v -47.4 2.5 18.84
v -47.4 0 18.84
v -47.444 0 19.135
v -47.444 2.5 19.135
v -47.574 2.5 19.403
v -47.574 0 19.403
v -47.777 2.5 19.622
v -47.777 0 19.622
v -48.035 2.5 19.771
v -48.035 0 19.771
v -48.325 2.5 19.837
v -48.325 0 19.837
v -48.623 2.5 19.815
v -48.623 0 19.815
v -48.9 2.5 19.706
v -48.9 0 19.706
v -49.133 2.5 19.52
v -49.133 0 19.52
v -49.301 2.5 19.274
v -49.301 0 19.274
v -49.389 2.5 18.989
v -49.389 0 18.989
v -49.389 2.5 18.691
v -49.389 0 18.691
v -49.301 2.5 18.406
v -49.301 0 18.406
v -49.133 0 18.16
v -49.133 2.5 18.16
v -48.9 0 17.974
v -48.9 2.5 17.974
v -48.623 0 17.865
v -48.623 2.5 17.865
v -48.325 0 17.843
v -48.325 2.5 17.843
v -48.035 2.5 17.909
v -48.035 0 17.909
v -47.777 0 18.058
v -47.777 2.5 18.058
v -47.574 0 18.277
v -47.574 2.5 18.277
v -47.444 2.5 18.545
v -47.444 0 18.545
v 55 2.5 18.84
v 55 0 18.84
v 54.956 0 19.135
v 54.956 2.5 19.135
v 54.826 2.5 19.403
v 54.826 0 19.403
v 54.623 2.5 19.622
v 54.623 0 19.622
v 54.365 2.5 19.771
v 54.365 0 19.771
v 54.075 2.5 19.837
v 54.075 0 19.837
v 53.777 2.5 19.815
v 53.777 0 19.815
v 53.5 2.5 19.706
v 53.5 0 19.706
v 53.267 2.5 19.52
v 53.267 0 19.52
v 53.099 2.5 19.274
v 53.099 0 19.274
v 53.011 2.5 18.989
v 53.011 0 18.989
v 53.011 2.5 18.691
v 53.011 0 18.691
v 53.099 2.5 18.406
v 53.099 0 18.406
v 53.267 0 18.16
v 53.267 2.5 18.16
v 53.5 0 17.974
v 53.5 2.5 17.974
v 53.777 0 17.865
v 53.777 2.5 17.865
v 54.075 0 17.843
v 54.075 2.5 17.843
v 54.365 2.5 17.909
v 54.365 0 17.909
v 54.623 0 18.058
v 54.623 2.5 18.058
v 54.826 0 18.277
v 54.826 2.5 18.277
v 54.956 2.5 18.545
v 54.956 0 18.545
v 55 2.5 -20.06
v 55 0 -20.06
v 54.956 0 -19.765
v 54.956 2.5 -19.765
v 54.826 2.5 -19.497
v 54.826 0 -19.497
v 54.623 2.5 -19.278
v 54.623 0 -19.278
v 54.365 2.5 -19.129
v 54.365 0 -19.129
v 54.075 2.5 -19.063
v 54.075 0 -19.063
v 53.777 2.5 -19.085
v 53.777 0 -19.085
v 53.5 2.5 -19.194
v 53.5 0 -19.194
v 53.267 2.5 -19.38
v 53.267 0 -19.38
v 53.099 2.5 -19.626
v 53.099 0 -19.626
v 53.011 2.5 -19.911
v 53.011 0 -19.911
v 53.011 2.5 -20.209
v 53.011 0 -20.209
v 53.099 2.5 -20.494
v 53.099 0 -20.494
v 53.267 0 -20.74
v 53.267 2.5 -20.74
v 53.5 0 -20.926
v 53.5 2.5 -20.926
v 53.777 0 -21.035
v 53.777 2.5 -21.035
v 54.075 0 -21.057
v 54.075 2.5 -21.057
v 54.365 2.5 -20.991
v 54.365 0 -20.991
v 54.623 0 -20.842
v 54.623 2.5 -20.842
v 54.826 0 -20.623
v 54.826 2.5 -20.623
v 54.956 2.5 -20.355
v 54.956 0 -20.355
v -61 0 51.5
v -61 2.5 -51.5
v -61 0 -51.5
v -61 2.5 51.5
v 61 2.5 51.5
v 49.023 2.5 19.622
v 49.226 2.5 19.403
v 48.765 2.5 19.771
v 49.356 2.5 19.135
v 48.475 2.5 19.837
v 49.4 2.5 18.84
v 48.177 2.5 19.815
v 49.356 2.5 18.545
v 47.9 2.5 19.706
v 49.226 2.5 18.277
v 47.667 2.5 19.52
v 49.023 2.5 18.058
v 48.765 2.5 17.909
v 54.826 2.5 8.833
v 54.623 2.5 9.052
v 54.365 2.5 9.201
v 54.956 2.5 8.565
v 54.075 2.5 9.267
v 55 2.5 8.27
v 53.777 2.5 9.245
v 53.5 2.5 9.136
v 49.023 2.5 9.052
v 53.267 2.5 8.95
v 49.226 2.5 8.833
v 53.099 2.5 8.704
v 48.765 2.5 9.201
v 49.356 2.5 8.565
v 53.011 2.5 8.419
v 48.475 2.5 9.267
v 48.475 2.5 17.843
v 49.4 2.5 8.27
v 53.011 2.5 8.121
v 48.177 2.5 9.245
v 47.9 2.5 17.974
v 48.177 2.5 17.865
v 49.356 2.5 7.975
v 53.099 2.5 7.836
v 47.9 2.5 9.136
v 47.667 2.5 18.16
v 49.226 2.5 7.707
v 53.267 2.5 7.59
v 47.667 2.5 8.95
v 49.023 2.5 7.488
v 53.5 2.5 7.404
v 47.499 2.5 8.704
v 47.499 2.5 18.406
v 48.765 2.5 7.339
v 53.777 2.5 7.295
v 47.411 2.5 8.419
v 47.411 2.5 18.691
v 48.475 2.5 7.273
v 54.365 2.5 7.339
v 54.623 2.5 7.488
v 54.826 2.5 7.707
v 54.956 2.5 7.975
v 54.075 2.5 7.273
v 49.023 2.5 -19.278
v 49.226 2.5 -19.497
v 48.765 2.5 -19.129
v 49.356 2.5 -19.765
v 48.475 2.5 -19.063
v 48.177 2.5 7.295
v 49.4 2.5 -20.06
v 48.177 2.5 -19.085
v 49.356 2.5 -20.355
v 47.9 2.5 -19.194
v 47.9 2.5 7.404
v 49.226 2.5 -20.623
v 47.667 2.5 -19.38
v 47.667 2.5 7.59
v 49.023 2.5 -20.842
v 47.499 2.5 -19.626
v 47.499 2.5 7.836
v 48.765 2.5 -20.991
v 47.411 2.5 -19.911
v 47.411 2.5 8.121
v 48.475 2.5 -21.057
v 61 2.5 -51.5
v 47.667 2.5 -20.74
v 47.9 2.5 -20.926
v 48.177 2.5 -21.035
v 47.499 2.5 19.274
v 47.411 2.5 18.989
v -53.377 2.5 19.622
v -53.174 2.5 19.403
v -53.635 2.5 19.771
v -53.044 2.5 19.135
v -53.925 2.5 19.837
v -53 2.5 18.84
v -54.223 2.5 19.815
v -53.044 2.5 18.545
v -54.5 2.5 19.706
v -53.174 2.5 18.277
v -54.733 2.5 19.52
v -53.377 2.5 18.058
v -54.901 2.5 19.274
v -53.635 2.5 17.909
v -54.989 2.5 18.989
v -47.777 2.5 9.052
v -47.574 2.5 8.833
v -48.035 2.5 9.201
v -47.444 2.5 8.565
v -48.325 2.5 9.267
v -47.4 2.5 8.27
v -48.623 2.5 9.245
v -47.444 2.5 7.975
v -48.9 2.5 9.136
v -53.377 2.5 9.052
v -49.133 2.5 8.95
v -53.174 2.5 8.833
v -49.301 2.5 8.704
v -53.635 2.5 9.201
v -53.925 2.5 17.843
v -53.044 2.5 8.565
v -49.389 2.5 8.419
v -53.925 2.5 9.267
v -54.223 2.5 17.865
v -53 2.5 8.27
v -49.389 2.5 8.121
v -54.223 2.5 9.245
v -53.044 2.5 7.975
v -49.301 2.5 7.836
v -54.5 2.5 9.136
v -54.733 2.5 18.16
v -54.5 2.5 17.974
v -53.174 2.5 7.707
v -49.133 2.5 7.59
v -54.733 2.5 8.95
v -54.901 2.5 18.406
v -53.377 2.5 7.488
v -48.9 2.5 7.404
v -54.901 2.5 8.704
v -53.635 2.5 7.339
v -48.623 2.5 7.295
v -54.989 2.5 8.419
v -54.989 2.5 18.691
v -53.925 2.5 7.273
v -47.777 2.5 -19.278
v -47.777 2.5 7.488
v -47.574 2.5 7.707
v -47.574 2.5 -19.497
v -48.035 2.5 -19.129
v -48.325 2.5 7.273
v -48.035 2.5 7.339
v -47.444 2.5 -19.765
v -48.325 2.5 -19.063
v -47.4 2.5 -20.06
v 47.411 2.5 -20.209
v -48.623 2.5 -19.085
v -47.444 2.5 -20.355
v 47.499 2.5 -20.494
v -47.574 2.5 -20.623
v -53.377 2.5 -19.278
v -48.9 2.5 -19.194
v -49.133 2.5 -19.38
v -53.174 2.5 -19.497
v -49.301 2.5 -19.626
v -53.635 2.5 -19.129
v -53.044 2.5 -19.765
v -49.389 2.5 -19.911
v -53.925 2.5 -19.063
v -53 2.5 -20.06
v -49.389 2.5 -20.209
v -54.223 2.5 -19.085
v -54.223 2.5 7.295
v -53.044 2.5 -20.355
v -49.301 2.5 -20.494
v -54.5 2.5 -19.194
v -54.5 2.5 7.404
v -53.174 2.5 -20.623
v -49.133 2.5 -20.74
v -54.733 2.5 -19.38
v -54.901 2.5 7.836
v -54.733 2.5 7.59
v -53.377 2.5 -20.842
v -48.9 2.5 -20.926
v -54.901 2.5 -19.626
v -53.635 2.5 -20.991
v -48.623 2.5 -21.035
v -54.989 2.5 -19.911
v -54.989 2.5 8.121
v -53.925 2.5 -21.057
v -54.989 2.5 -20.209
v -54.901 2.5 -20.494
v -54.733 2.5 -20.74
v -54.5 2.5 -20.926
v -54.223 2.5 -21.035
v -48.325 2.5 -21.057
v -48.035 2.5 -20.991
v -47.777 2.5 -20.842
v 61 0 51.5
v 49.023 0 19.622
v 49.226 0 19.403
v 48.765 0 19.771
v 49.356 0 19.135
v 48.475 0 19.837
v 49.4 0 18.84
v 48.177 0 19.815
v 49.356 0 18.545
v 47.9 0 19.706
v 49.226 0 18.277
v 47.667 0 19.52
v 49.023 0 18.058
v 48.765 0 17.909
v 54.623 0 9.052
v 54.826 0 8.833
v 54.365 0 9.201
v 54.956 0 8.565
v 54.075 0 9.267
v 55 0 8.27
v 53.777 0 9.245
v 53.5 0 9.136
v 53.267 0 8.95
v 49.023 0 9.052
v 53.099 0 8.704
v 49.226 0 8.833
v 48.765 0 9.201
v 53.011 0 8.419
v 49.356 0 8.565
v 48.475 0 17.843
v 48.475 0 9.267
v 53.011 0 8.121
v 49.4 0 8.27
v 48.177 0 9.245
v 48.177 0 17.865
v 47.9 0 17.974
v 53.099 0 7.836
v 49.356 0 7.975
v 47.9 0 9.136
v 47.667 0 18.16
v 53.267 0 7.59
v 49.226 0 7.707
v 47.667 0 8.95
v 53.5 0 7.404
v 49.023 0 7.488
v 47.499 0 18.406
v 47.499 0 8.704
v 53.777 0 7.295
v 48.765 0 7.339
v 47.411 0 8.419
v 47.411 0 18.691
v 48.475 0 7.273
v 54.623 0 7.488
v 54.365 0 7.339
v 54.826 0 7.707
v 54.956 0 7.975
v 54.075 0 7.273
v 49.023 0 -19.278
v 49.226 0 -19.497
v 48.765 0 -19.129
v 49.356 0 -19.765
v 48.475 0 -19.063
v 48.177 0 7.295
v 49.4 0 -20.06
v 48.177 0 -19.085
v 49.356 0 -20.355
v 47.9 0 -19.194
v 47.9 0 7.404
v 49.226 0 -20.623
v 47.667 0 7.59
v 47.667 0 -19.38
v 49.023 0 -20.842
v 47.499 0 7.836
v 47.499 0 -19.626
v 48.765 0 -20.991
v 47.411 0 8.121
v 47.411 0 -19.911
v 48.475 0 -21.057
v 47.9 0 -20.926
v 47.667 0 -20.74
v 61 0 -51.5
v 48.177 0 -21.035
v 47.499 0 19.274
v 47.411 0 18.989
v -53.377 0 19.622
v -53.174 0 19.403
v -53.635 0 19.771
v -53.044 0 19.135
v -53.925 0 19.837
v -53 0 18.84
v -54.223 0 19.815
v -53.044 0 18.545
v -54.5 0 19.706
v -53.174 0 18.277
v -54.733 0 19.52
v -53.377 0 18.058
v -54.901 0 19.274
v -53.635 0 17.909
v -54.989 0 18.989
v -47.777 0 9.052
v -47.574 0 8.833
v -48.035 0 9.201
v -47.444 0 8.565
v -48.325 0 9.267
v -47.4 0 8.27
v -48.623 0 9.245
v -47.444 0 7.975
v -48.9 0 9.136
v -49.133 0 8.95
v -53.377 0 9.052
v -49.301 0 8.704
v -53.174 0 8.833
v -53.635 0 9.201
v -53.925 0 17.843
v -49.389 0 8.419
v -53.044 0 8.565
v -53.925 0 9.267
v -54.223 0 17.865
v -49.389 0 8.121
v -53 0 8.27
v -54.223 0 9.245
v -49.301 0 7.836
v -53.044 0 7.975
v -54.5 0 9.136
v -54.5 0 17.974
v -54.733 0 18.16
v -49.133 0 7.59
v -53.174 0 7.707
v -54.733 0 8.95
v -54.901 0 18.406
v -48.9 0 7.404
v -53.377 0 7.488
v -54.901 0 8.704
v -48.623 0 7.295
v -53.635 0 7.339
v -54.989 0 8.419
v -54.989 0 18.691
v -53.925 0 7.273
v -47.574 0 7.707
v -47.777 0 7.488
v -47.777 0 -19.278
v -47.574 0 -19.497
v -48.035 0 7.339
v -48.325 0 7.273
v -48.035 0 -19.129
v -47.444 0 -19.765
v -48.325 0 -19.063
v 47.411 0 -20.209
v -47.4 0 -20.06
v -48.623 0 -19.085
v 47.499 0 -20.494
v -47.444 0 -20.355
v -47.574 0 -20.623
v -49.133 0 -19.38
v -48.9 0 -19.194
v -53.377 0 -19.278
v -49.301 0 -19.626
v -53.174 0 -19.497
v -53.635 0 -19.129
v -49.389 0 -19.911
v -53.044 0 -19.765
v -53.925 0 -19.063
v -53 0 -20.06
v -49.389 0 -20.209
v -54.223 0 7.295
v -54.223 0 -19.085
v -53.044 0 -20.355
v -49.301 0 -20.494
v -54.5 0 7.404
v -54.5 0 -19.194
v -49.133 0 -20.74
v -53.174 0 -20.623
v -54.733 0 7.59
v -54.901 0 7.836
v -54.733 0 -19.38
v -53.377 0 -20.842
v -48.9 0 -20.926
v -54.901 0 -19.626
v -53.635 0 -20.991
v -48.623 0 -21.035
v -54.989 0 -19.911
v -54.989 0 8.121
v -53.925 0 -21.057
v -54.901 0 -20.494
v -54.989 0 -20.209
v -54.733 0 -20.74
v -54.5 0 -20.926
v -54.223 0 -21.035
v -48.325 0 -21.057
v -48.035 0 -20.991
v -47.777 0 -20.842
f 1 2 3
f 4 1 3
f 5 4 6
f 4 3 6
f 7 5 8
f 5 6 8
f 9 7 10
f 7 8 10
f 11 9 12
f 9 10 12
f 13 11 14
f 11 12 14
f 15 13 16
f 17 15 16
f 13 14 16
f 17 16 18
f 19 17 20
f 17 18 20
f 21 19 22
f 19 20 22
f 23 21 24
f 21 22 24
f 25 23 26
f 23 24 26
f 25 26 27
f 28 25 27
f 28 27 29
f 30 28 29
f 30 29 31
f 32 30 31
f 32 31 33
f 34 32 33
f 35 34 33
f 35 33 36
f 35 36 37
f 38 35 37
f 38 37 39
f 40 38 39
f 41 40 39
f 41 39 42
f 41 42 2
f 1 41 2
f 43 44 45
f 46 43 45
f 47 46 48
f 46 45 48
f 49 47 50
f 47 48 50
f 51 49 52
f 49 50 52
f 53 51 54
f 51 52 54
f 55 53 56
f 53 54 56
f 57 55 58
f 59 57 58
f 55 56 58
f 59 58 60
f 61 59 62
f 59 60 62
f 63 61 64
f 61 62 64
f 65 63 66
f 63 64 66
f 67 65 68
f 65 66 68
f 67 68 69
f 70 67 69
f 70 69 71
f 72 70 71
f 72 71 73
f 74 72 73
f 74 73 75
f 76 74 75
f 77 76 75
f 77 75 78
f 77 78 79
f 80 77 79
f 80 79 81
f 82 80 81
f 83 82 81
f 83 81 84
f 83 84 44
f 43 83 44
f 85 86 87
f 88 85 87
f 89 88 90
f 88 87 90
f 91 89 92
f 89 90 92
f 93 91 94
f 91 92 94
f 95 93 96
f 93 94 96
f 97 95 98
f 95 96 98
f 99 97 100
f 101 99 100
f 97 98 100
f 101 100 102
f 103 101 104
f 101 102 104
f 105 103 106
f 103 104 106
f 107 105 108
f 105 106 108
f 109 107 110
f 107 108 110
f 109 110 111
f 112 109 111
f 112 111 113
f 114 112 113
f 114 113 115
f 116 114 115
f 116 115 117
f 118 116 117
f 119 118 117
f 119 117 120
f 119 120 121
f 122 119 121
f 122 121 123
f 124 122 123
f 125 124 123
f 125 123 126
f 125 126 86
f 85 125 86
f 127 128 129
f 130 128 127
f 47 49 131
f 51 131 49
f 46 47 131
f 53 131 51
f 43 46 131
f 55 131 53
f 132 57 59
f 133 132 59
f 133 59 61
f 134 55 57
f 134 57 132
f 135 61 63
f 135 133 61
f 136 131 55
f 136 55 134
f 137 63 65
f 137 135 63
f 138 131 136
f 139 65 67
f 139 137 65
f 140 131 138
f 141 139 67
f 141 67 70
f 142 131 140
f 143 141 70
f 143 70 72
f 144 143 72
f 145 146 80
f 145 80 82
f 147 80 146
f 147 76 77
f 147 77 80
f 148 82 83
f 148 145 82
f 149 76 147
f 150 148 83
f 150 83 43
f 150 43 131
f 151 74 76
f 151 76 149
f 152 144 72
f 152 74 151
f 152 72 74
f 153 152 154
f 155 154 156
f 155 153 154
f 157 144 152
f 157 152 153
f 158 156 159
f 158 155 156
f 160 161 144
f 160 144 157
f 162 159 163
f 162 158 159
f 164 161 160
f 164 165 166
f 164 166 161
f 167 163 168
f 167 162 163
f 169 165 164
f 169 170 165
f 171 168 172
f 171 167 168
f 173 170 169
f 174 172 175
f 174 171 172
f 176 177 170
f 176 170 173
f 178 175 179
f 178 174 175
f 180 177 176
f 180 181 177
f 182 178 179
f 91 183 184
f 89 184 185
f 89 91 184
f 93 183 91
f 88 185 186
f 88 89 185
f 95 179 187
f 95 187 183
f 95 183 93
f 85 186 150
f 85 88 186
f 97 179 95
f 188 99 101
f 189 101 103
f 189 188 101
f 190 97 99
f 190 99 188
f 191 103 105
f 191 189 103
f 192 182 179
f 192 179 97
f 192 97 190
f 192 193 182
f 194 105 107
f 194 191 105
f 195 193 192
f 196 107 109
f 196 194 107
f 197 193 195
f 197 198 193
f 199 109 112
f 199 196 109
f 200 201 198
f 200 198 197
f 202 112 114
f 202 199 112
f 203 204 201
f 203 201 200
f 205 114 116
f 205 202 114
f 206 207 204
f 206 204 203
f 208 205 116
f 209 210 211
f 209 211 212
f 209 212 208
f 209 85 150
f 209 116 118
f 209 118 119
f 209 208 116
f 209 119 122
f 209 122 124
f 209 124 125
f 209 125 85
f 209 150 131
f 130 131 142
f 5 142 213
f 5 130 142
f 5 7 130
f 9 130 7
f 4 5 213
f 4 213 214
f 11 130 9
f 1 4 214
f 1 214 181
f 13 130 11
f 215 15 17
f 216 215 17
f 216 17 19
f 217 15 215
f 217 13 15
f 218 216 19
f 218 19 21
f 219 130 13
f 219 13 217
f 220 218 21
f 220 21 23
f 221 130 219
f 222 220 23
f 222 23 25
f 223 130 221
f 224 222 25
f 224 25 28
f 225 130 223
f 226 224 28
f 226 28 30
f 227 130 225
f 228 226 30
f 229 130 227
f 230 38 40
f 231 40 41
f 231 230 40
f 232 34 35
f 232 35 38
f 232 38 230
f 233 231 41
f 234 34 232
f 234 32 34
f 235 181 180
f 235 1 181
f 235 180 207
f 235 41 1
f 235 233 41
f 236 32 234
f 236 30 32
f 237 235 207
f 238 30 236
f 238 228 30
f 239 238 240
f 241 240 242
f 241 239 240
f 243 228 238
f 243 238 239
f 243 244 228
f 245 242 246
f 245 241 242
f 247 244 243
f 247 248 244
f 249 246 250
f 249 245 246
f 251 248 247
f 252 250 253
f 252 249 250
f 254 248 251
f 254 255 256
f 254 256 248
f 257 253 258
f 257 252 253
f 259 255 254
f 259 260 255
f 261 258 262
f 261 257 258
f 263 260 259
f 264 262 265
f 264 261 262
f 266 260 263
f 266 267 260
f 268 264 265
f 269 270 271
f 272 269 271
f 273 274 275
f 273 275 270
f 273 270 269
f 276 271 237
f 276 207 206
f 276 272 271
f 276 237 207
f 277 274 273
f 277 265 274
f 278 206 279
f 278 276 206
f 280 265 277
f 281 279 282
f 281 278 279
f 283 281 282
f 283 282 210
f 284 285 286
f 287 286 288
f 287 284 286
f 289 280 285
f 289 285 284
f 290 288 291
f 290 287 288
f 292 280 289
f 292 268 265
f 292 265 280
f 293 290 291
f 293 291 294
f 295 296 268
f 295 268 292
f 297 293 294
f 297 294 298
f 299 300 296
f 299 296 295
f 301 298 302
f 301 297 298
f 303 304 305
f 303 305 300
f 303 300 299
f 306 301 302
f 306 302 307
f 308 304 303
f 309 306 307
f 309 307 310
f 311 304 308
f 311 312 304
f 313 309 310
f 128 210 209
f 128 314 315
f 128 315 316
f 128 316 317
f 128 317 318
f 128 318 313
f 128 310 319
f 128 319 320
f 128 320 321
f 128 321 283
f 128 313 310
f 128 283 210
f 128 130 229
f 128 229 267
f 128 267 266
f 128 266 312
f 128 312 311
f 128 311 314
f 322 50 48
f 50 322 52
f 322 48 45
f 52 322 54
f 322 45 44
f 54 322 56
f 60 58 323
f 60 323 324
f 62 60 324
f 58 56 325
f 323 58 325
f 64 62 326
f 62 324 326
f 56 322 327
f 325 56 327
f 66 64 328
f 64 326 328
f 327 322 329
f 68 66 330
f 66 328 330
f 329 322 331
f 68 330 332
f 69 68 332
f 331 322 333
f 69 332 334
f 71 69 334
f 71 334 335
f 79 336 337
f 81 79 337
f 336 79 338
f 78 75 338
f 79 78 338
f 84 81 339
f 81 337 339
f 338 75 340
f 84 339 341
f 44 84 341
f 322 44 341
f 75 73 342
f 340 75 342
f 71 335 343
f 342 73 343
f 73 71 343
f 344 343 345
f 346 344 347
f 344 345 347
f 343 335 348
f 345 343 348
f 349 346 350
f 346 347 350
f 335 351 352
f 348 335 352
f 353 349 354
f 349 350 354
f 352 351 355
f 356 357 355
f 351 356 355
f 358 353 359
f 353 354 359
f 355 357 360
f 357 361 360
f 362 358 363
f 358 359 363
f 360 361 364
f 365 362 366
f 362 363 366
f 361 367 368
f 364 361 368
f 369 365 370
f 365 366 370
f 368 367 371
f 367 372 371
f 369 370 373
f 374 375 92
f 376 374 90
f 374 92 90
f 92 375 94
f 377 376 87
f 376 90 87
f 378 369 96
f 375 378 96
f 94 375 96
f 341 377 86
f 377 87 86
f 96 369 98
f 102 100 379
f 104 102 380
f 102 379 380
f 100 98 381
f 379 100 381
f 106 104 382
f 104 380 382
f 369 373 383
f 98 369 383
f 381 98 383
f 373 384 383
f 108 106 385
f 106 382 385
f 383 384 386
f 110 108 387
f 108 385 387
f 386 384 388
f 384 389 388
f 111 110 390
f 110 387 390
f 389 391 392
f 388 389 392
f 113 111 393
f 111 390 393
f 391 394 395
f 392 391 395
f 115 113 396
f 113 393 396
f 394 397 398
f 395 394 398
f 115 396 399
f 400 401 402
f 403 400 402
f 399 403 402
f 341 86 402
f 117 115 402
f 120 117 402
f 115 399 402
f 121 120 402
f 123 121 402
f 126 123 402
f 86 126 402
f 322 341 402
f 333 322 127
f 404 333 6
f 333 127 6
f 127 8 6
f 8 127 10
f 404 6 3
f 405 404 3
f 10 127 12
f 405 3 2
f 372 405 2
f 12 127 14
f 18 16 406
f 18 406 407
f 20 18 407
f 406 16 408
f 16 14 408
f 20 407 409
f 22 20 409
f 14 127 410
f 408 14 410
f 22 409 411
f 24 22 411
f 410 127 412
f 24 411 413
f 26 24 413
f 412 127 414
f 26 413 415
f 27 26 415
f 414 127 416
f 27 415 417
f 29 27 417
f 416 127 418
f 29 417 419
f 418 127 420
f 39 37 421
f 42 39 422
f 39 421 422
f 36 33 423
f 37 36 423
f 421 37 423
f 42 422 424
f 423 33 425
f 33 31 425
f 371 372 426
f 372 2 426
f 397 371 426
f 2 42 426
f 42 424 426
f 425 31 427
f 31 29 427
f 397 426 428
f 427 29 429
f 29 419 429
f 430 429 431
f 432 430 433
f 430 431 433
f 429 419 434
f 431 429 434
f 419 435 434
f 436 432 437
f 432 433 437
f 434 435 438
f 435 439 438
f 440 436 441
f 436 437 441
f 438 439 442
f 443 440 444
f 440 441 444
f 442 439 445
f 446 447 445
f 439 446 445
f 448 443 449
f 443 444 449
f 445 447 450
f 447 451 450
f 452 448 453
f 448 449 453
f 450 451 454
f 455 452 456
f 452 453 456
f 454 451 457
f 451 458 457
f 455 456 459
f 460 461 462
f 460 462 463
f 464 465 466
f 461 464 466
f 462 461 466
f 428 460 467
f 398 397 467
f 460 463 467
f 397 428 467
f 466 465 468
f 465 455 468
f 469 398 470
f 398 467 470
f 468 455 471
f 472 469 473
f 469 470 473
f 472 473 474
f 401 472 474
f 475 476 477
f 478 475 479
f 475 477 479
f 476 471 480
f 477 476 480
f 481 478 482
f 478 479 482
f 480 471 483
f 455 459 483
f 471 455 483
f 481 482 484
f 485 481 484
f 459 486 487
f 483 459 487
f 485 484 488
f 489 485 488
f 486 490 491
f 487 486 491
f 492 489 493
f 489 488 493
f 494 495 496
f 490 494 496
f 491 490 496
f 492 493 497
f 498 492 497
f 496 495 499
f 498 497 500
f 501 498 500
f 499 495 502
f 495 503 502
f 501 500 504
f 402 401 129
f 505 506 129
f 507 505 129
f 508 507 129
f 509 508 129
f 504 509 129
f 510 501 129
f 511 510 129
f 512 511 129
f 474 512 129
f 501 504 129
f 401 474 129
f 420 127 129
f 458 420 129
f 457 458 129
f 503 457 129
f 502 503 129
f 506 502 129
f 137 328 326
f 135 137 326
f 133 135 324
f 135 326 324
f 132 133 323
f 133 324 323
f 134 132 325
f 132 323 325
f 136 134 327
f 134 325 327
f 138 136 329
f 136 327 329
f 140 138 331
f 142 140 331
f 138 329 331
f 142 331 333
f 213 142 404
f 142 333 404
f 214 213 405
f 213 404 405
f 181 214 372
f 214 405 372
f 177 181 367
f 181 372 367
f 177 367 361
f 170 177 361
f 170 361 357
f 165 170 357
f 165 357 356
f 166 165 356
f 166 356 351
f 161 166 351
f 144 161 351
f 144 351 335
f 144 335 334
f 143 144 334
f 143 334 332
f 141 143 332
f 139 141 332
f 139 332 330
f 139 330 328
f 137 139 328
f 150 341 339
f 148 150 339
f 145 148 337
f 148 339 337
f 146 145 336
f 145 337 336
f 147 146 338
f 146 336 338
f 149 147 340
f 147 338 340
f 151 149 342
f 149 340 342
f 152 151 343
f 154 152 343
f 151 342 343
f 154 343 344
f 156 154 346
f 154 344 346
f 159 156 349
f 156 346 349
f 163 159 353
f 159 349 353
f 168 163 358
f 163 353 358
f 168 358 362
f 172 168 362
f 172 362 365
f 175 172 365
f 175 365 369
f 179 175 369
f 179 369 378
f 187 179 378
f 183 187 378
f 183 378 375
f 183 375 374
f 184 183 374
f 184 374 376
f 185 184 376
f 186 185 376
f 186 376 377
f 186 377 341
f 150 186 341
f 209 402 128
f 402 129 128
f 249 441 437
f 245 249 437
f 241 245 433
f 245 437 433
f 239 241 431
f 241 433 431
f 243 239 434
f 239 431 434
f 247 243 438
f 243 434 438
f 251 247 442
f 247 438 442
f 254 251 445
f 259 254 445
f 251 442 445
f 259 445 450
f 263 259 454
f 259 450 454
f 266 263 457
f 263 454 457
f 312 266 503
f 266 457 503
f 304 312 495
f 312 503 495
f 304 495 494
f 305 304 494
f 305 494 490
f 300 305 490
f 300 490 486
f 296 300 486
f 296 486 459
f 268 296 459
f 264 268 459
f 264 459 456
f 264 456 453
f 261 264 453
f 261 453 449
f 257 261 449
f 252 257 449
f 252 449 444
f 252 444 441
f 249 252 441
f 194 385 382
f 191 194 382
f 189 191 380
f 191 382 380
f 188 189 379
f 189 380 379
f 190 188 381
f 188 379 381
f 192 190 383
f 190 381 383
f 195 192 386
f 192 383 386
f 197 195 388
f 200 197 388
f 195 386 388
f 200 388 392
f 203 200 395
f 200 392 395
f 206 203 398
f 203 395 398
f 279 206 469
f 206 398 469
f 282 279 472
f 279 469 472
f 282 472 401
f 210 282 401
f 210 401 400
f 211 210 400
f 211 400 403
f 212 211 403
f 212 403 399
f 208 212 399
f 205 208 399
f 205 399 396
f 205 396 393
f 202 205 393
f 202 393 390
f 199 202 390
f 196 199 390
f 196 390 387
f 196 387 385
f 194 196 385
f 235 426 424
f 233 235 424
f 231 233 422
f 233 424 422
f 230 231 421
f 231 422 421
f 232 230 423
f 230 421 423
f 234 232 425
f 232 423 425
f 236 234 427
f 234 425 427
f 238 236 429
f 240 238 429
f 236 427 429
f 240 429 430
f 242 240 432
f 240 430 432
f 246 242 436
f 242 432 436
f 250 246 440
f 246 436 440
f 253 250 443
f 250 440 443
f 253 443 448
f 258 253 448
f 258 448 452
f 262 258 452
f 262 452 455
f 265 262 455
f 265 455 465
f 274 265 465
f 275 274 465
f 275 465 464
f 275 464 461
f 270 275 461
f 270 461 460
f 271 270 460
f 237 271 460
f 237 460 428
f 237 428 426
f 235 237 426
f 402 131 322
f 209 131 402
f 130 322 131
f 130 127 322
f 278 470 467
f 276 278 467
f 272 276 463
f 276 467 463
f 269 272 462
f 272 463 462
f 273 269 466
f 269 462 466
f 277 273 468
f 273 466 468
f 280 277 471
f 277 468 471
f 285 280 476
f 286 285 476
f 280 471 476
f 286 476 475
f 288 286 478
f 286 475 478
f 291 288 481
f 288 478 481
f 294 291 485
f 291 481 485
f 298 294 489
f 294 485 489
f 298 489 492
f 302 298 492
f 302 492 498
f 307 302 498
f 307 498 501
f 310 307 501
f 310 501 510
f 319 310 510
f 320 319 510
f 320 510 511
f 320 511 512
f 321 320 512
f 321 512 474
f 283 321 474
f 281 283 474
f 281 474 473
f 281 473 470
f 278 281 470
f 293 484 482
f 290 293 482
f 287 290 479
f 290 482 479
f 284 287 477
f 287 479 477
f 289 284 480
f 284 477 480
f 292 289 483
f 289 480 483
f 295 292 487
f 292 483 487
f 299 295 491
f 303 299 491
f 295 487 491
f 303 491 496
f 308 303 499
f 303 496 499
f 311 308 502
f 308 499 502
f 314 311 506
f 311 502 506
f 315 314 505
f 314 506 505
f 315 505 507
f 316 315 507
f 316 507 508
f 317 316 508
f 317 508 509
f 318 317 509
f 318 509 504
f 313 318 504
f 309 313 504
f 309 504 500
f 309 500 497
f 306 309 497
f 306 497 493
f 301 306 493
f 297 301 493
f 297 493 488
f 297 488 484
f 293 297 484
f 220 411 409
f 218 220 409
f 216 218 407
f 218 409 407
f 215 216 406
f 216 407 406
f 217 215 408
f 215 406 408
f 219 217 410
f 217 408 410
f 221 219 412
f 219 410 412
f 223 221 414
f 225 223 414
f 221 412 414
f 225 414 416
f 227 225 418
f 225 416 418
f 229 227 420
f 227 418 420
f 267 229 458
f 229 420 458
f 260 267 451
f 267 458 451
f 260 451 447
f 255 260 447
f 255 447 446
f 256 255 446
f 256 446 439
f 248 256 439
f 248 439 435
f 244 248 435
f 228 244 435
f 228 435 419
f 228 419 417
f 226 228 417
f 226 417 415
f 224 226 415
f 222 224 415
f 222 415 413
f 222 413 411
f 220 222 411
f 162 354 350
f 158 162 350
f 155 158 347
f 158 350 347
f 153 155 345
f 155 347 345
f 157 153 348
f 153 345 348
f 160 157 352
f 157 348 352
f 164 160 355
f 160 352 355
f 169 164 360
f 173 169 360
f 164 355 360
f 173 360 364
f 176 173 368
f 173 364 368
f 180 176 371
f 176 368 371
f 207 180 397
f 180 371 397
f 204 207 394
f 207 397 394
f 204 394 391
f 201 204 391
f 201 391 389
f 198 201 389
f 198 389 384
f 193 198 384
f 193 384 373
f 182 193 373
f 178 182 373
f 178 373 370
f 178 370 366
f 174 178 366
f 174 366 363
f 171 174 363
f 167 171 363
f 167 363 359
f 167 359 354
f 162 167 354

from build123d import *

# Parameters (mm, degrees)
SKETCH1_W           = 119
SKETCH1_H           = 103
BOSS_EXTRUDE1_DEPTH = 2.5
SKETCH2_R           = 1
CUT_EXTRUDE1_DEPTH  = 10
SKETCH3_W           = 103
SKETCH3_H           = 2.5
BOSS_EXTRUDE2_DEPTH = 1.5
SKETCH4_W           = 103
SKETCH4_H           = 2.5
BOSS_EXTRUDE3_DEPTH = 1.5


with BuildPart() as part:
    # Sketch1 → Boss-Extrude1 (new body)
    with BuildSketch(Plane(origin=(0, 0, 0), x_dir=(1, 0, 0), z_dir=(0, 1, 0))):
        Rectangle(SKETCH1_W, SKETCH1_H)
    extrude(amount=BOSS_EXTRUDE1_DEPTH)

    # Sketch2 → Cut-Extrude1 (cut)
    with BuildSketch(Plane.XZ):
        with Locations((-54, -20.06)):
            Circle(SKETCH2_R)
        with Locations((-54, 8.27)):
            Circle(SKETCH2_R)
        with Locations((-54, 18.84)):
            Circle(SKETCH2_R)
        with Locations((54, -20.06)):
            Circle(SKETCH2_R)
        with Locations((54, 8.27)):
            Circle(SKETCH2_R)
        with Locations((54, 18.84)):
            Circle(SKETCH2_R)
        with Locations((-48.4, 18.84)):
            Circle(SKETCH2_R)
        with Locations((-48.4, -20.06)):
            Circle(SKETCH2_R)
        with Locations((-48.4, 8.27)):
            Circle(SKETCH2_R)
        with Locations((48.4, -20.06)):
            Circle(SKETCH2_R)
        with Locations((48.4, 8.27)):
            Circle(SKETCH2_R)
        with Locations((48.4, 18.84)):
            Circle(SKETCH2_R)
    extrude(amount=-CUT_EXTRUDE1_DEPTH, mode=Mode.SUBTRACT)

    # Sketch3 → Boss-Extrude2 (add)
    with BuildSketch(Plane.ZY.offset(59.5)):
        with Locations((0, 1.25)):
            Rectangle(SKETCH3_W, SKETCH3_H)
    extrude(amount=BOSS_EXTRUDE2_DEPTH)

    # Sketch4 → Boss-Extrude3 (add)
    with BuildSketch(Plane(origin=(59.5, 0, 0), x_dir=(0, 0, -1), z_dir=(1, 0, 0))):
        with Locations((0, 1.25)):
            Rectangle(SKETCH4_W, SKETCH4_H)
    extrude(amount=BOSS_EXTRUDE3_DEPTH)


solid = part.part
